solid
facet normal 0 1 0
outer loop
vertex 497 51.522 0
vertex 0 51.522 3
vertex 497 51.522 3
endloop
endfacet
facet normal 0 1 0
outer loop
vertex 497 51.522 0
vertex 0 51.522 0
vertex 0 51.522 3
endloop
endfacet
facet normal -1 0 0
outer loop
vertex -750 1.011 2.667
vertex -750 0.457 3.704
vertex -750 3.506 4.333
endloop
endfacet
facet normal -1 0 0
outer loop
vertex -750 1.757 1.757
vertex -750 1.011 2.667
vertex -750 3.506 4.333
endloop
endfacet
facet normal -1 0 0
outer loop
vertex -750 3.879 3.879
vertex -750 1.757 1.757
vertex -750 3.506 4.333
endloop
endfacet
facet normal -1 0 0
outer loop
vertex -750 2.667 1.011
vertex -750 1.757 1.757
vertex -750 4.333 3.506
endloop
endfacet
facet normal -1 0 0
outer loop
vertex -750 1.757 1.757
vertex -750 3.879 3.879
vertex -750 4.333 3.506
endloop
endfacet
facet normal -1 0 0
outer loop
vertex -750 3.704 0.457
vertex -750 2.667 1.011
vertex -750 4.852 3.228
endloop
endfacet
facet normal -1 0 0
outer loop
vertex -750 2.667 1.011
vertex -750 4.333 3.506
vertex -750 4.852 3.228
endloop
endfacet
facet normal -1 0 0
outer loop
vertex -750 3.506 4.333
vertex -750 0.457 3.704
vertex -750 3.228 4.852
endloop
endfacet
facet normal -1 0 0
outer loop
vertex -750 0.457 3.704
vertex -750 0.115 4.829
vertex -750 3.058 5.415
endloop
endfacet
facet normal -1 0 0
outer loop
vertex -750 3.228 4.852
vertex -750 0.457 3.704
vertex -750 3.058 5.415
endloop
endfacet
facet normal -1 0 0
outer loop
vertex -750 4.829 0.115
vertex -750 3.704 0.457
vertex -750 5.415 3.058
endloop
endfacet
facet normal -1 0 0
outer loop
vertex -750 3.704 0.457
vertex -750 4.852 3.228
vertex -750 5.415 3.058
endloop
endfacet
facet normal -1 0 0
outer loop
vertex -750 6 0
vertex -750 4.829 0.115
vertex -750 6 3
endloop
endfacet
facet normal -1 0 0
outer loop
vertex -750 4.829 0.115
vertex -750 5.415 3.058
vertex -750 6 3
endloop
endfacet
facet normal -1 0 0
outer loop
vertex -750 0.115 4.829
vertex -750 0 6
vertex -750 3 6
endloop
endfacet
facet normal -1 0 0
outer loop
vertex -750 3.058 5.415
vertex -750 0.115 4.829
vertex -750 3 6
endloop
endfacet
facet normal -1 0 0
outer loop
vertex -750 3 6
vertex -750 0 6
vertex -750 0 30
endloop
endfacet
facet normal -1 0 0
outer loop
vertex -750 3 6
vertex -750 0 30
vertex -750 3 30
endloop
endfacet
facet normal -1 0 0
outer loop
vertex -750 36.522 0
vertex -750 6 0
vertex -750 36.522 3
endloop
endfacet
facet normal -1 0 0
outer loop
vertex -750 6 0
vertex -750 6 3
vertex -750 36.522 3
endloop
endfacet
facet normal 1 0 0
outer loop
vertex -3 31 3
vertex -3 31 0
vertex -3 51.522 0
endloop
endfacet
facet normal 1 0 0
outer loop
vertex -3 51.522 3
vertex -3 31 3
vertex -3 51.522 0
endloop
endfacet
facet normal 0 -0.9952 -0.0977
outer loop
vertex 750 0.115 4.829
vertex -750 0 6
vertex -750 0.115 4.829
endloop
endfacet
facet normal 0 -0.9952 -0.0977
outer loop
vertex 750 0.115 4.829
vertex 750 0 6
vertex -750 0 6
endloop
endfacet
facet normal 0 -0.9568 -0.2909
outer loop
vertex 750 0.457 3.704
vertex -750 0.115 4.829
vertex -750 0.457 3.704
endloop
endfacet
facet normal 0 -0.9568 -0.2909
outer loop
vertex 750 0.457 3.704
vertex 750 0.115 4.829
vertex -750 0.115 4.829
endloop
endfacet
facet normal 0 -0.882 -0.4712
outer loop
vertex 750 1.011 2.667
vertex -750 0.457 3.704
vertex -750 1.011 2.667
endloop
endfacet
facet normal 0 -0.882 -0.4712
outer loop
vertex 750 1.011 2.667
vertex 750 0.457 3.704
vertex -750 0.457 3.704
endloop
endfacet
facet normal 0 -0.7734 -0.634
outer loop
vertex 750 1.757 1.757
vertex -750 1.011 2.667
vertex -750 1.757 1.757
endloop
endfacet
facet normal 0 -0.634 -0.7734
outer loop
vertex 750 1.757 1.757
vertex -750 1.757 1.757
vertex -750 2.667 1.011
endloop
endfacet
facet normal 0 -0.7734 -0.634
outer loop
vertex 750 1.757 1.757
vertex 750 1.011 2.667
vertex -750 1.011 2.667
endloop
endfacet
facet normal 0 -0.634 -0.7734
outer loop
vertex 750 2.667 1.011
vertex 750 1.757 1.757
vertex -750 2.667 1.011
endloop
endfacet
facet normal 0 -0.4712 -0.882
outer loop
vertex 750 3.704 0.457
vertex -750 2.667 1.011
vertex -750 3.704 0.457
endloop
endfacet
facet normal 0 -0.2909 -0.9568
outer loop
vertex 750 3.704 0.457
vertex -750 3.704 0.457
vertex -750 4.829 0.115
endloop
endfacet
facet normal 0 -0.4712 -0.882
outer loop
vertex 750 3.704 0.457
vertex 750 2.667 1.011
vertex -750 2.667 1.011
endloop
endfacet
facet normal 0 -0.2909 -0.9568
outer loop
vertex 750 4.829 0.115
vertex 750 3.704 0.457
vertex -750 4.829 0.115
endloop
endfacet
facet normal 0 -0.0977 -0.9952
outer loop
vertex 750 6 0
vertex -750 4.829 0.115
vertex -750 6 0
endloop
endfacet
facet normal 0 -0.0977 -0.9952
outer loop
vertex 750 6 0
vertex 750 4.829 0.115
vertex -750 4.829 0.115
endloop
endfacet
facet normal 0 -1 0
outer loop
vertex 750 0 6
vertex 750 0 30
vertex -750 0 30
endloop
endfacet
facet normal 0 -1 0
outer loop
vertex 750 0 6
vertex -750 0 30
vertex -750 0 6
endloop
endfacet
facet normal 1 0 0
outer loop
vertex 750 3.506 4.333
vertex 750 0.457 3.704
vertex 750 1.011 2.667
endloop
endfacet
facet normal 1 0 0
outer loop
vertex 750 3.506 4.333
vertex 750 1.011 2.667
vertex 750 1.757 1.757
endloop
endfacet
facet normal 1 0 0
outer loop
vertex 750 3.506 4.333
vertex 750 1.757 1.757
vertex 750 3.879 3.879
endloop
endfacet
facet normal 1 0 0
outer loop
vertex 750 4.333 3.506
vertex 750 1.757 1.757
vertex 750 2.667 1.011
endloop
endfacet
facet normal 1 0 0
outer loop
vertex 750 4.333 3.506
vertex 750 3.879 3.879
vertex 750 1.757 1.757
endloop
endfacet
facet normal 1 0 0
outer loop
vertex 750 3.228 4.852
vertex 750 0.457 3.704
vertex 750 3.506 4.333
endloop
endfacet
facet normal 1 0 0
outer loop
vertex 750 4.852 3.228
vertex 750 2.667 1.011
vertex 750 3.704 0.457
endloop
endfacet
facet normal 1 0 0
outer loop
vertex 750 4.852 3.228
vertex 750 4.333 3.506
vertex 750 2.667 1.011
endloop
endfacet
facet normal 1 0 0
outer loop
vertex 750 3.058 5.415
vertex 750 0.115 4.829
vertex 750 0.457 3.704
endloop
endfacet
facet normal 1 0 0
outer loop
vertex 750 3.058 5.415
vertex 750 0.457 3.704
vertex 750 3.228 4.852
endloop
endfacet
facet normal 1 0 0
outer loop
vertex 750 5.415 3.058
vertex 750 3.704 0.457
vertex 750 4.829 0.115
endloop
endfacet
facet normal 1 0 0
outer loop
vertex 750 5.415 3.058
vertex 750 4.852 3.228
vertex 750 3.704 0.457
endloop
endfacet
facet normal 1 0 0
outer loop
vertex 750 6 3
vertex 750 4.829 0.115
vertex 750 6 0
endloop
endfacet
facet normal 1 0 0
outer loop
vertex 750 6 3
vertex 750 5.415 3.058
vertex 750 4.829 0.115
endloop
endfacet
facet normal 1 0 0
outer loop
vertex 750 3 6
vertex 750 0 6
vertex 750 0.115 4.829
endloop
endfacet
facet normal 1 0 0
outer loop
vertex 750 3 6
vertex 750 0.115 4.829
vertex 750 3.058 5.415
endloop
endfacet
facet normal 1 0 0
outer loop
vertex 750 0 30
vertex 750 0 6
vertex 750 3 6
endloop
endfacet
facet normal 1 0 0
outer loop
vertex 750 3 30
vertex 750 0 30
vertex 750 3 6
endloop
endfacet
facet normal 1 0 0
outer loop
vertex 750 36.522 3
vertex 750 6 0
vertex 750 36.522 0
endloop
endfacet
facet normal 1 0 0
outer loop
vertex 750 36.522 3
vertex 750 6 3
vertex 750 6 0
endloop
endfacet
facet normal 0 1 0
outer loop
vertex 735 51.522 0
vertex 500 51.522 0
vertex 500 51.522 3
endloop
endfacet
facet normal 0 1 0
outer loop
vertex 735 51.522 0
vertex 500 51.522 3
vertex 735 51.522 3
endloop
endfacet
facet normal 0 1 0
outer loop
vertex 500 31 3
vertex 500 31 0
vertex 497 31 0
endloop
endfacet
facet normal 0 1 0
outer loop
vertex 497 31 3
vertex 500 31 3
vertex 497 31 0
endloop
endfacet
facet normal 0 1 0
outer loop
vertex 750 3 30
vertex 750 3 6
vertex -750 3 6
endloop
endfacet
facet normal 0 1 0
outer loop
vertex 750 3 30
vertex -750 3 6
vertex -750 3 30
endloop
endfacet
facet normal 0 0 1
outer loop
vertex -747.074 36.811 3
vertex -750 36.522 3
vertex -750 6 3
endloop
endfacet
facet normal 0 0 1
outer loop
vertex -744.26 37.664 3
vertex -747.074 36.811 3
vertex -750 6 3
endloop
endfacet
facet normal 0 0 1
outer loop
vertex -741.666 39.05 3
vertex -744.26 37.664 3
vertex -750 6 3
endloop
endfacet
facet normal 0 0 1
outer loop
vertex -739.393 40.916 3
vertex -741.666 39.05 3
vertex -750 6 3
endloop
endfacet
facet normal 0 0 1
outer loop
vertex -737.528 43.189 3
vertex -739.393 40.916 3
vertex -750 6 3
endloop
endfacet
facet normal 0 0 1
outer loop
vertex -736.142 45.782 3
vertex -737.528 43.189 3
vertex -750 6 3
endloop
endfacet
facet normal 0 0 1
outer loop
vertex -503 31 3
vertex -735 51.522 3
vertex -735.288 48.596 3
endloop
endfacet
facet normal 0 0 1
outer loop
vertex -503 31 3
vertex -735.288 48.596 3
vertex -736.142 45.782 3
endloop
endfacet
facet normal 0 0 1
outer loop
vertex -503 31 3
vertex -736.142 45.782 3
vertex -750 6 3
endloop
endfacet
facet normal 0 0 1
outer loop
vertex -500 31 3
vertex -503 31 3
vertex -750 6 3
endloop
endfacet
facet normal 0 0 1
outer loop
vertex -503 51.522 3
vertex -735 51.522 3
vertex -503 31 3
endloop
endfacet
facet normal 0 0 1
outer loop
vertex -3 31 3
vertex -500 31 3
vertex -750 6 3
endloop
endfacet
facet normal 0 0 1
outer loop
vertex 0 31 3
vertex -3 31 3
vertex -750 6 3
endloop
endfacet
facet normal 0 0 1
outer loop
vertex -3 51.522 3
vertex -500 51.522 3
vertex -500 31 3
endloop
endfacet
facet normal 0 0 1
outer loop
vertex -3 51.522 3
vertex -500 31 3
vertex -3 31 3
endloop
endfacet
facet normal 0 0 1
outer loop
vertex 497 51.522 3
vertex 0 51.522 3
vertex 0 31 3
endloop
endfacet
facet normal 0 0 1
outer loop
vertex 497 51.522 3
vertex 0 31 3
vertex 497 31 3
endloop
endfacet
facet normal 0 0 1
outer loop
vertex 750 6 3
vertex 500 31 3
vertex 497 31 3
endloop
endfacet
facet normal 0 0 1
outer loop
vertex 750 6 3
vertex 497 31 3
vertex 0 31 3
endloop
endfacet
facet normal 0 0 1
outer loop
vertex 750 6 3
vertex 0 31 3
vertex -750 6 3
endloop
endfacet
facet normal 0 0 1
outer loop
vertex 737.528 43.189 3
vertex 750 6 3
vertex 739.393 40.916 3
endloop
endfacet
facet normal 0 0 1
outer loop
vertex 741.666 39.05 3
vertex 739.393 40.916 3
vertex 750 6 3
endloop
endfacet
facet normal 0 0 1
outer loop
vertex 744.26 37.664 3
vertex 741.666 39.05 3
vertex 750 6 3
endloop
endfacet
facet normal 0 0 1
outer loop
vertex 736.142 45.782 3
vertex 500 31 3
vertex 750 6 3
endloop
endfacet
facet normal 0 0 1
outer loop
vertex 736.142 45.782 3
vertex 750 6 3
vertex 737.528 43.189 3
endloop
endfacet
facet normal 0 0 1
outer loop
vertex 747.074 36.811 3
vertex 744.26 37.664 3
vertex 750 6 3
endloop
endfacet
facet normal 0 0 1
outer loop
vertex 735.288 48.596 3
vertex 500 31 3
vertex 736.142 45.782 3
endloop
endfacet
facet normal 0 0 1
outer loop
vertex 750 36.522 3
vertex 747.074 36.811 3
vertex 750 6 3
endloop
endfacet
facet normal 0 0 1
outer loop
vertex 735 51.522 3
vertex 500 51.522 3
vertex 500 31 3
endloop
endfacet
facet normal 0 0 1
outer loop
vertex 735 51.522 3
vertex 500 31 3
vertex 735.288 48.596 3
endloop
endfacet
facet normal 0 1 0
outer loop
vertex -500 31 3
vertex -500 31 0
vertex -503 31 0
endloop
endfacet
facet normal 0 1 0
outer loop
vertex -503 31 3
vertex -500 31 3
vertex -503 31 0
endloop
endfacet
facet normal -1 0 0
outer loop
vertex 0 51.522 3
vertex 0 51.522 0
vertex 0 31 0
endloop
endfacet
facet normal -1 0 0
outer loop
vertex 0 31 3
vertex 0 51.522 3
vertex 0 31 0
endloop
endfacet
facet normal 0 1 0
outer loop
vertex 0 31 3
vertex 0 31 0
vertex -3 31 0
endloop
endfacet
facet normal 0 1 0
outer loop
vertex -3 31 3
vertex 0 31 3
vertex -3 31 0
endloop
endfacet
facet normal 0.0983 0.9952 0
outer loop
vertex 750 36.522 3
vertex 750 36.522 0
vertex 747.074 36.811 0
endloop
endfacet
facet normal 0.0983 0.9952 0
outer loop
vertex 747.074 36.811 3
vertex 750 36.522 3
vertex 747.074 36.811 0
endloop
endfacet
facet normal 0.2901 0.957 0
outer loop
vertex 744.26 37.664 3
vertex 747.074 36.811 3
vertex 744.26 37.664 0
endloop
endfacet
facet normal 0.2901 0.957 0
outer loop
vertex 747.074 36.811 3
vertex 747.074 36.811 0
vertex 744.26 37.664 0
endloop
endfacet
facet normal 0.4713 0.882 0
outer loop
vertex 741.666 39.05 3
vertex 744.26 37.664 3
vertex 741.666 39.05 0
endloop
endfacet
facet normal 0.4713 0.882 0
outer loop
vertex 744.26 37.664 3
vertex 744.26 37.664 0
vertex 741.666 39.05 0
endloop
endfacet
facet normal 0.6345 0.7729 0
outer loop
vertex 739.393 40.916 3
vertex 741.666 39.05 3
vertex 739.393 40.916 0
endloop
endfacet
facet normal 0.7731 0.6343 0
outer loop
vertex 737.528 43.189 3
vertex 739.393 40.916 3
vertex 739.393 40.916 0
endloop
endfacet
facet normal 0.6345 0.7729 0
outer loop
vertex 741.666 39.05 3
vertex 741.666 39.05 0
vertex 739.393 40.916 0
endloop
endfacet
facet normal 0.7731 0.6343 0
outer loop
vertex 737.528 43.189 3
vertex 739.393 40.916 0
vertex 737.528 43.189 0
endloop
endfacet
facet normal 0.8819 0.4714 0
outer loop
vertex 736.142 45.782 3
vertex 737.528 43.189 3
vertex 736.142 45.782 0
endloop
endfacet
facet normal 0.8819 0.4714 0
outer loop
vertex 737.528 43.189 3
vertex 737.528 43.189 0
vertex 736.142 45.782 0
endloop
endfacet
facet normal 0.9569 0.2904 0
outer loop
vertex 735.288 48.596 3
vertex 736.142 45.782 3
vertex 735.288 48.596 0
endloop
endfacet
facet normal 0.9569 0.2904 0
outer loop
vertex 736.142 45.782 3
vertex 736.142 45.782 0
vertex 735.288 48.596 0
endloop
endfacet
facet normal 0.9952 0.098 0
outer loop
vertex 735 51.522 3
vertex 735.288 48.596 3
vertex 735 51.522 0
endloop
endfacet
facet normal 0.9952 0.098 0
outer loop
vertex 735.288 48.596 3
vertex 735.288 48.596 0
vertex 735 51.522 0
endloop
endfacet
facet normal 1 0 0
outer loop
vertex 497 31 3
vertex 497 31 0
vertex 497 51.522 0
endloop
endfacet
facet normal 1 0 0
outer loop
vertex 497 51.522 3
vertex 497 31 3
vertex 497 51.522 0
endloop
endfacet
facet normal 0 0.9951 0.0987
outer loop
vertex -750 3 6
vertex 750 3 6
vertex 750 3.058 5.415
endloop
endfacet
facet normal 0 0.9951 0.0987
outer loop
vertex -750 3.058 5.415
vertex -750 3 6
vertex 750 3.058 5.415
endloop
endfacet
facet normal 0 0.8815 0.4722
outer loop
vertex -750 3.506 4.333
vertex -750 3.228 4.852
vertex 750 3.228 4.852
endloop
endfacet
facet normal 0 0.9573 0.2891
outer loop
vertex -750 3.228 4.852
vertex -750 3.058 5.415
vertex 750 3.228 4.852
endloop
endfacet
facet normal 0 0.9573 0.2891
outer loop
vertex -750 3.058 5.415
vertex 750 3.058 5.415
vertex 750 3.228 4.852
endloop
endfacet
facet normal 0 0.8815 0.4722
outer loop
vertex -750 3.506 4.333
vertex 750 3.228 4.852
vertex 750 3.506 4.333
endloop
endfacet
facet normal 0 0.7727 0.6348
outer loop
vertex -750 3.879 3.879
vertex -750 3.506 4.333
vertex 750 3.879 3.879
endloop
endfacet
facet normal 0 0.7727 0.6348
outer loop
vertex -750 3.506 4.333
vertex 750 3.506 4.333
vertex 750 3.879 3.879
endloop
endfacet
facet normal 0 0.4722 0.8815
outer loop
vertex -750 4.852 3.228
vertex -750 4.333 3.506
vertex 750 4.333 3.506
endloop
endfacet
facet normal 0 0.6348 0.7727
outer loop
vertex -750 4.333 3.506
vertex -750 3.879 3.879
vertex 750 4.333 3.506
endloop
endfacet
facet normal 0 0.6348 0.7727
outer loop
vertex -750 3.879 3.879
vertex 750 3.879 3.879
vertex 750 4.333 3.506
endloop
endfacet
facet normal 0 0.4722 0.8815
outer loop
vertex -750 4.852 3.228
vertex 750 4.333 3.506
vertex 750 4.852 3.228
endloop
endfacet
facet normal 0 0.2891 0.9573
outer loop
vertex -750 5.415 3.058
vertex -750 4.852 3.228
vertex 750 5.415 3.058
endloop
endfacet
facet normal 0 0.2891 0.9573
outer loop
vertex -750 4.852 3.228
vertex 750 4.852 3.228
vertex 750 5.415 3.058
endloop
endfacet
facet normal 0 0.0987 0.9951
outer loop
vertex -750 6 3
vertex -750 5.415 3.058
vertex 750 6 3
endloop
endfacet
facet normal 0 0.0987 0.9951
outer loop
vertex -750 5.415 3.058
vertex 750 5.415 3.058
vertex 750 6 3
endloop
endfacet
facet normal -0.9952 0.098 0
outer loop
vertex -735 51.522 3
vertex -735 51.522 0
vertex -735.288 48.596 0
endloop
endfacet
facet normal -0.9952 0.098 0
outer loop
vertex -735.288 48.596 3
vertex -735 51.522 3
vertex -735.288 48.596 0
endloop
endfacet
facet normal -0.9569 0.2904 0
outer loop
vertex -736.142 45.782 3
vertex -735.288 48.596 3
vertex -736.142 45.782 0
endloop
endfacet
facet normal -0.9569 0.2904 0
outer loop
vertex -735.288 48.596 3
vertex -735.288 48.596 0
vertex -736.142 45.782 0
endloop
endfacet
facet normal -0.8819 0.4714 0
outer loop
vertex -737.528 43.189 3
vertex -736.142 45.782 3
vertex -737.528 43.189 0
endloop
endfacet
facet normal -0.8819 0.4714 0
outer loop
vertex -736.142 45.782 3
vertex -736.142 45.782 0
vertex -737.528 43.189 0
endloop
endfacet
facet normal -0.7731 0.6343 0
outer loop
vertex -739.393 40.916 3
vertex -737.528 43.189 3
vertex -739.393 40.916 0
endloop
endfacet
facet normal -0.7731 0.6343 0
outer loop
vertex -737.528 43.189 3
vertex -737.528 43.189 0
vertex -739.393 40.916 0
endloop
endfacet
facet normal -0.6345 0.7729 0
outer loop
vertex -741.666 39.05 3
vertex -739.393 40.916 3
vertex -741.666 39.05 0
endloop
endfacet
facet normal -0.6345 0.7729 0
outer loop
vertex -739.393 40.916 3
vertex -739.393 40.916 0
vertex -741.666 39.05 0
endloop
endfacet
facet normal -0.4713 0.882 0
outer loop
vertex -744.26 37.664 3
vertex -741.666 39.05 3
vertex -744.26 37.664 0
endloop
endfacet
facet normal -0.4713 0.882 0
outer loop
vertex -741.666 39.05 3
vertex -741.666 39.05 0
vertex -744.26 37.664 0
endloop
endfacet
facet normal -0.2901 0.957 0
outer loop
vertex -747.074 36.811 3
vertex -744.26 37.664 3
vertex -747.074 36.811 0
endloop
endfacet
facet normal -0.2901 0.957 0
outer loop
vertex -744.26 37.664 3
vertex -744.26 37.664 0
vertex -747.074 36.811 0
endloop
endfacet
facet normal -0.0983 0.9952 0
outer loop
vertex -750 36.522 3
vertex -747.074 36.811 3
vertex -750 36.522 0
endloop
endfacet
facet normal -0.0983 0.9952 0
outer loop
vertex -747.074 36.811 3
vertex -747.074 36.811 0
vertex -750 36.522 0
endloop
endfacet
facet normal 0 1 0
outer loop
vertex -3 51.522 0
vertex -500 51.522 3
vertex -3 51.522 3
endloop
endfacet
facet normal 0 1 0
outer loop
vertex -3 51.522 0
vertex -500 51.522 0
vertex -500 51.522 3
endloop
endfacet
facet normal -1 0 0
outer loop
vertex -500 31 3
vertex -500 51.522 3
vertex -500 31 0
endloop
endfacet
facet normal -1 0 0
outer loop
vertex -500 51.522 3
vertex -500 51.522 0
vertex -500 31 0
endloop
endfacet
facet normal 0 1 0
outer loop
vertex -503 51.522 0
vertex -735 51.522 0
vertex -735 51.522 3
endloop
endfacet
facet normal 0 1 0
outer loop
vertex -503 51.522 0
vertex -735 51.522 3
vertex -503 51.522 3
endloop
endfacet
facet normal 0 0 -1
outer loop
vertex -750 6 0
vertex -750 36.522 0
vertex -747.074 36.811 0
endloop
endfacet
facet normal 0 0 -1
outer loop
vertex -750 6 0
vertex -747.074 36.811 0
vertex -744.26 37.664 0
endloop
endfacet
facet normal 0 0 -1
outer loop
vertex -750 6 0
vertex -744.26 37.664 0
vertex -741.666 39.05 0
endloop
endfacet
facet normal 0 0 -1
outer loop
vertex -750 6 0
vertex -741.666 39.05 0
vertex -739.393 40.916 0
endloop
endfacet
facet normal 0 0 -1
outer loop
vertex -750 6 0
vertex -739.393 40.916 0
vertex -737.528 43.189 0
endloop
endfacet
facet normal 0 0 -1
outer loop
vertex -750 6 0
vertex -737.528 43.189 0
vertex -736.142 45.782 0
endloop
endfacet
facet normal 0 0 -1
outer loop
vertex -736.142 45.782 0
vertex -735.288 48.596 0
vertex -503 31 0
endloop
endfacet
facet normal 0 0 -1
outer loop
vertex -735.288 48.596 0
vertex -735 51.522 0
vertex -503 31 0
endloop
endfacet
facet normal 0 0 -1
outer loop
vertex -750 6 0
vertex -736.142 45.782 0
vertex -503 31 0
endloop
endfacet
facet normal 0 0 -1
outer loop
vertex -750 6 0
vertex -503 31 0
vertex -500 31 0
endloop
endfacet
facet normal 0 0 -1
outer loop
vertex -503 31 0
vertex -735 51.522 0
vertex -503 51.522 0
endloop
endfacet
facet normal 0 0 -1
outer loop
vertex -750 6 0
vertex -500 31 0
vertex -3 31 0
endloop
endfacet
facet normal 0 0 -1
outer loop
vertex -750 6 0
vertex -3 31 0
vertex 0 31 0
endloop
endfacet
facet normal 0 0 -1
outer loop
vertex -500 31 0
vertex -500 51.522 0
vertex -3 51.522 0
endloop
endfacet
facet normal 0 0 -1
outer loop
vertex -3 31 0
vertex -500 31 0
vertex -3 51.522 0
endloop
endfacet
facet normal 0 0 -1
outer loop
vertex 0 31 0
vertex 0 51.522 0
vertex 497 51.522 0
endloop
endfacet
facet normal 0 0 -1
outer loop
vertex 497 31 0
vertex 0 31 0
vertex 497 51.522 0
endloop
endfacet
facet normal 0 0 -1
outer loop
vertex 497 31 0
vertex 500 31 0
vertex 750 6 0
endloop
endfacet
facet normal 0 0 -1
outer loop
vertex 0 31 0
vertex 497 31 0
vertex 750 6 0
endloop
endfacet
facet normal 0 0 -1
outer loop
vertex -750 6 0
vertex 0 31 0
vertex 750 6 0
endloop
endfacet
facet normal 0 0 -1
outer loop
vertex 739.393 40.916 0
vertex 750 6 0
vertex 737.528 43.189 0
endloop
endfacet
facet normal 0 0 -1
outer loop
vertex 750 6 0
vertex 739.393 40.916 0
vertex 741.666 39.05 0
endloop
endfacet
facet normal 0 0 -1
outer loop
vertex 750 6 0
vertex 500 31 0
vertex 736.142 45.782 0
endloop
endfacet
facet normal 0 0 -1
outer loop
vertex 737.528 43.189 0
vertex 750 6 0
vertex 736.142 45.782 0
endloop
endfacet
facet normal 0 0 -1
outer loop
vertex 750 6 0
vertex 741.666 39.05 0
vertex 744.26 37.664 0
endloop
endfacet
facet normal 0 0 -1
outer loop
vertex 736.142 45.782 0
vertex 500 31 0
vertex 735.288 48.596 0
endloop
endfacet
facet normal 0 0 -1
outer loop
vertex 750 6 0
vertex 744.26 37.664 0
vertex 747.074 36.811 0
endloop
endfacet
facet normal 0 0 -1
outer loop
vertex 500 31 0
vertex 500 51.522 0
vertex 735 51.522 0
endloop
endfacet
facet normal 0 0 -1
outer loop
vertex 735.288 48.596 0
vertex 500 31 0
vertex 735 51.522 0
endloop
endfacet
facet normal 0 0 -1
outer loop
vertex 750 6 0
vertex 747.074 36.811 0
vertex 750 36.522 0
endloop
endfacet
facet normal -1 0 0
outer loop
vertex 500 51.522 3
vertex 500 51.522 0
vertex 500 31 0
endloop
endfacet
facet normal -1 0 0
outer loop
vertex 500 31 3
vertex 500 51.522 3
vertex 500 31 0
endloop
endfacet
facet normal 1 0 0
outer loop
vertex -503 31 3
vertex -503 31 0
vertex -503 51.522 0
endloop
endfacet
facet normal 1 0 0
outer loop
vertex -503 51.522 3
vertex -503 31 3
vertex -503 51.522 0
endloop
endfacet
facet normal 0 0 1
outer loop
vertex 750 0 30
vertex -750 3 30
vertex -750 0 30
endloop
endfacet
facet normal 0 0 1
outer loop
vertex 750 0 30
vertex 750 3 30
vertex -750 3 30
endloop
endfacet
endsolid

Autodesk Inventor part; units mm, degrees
ref_plane "YZ Plane" through (0, 0, 0) normal (1, 0, 0) x (0, 1, 0)
ref_plane "XZ Plane" through (0, 0, 0) normal (0, 1, 0) x (-1, 0, 0)
ref_plane "XY Plane" through (0, 0, 0) normal (0, 0, 1) x (1, 0, 0)
sketch "Sketch1" plane through (0, 0, 0) normal (0, 0, 1) x (1, 0, 0)
  line L0 (-750, 51.5224) -> (750, 51.5224)
  line L1 (750, 51.5224) -> (750, 0)
  line L2 (750, 0) -> (-750, 0)
  line L3 (-750, 0) -> (-750, 51.5224)
  point P0 (0, 0)
  point P1 (0, 0)
  dimension "d0" = 1500
  dimension "d1" = 51.5224
extrude "Plate1" add sketch "Sketch1" along normal blind 3
sketch "Sketch2" plane through (750, 3, 0) normal (0, -1, 0) x (1, 0, 0)
  line L0 (-1500, 0) -> (0, 0)
  line L1 (0, 0) -> (0, 30)
  line L2 (0, 30) -> (-1500, 30)
  line L3 (-1500, 30) -> (-1500, 0)
edge flange "Flange1" height 30 angle 90 thickness 3 bend radius 3 thickness toward (0, -1, 0) relief tear relief width 3 relief depth 1.5 edges at (0, 0, 3) wall of the first edge with corners at (-750, 3, 0) (750, 3, 0) (750, 3, 30) (-750, 3, 30)
bend "Bend1"
corner "Corner1"
sketch "Sketch5" plane through (0, 0, 0) normal (0, 0, -1) x (-1, 0, 0)
  line L0 (750, 51.5224) -> (-750, 51.5224) projected
  line L1 (500, 51.5224) -> (500, 31)
  line L2 (500, 31) -> (503, 31)
  line L3 (503, 31) -> (503, 51.5224)
  line L4 (750, 0) -> (-750, 0) projected
  point P0 (0, 0)
  dimension "d18" = 3
  dimension "d19" = 247
  dimension "d20" = 31
extrude "Extrusion1" cut sketch "Sketch5" against normal through all
pattern_linear "Rectangular Pattern1" count 3 spacing 500 along (1, 0, 0) of "Extrusion1"
sketch "Sketch6" plane through (0, 0, 0) normal (0, 0, -1) x (-1, 0, 0)
  line L0 (-750, 51.5224) -> (-750, 6) projected
  circle A0 centre (-750, 51.5224) radius 15
  line L1 (-750, 51.5224) -> (-500, 51.5224) projected
  point P0 (0, 0)
  point P1 (-735, 51.5224)
  point P2 (-750, 36.5224)
  dimension "d24" = 30
extrude "Extrusion2" cut sketch "Sketch6" against normal through all contours L1 A0 L0 picked at (-740.1254, 50.4098)
mirror "Mirror1" about plane through (0, 0, 0) normal (1, 0, 0) of "Extrusion2"
equation "\"d1\" = Стрингер_5"
equation "\"d18\" = Thickness"
equation "\"d2\" = Thickness"
equation "\"d3\" = BendReliefWidth"
equation "\"d4\" = BendReliefDepth"
equation "\"d5\" = MinimumRemnant"
equation "\"d6\" = TransitionRadius"
equation "\"d9\" = BendRadius"
equation "\"d10\" = CornerReliefSize"
equation "\"d11\" = GapSize"
equation "\"d12\" = JacobiRadiusSize"
equation "\"BendRadius\" = Thickness"
equation "\"BendReliefWidth\" = Thickness"
equation "\"BendReliefDepth\" = 0.5 * Thickness"
equation "\"CornerReliefSize\" = 4 * Thickness"
equation "\"MinimumRemnant\" = 2 * Thickness"
equation "\"TransitionRadius\" = BendRadius"
equation "\"JacobiRadiusSize\" = BendRadius"
equation "\"GapSize\" = Thickness"
equation "\"Стрингер_5\" = 51.522376"
equation "\"Thickness\" = 3"
properties part number "МОО 055 стрингер борт 51"
